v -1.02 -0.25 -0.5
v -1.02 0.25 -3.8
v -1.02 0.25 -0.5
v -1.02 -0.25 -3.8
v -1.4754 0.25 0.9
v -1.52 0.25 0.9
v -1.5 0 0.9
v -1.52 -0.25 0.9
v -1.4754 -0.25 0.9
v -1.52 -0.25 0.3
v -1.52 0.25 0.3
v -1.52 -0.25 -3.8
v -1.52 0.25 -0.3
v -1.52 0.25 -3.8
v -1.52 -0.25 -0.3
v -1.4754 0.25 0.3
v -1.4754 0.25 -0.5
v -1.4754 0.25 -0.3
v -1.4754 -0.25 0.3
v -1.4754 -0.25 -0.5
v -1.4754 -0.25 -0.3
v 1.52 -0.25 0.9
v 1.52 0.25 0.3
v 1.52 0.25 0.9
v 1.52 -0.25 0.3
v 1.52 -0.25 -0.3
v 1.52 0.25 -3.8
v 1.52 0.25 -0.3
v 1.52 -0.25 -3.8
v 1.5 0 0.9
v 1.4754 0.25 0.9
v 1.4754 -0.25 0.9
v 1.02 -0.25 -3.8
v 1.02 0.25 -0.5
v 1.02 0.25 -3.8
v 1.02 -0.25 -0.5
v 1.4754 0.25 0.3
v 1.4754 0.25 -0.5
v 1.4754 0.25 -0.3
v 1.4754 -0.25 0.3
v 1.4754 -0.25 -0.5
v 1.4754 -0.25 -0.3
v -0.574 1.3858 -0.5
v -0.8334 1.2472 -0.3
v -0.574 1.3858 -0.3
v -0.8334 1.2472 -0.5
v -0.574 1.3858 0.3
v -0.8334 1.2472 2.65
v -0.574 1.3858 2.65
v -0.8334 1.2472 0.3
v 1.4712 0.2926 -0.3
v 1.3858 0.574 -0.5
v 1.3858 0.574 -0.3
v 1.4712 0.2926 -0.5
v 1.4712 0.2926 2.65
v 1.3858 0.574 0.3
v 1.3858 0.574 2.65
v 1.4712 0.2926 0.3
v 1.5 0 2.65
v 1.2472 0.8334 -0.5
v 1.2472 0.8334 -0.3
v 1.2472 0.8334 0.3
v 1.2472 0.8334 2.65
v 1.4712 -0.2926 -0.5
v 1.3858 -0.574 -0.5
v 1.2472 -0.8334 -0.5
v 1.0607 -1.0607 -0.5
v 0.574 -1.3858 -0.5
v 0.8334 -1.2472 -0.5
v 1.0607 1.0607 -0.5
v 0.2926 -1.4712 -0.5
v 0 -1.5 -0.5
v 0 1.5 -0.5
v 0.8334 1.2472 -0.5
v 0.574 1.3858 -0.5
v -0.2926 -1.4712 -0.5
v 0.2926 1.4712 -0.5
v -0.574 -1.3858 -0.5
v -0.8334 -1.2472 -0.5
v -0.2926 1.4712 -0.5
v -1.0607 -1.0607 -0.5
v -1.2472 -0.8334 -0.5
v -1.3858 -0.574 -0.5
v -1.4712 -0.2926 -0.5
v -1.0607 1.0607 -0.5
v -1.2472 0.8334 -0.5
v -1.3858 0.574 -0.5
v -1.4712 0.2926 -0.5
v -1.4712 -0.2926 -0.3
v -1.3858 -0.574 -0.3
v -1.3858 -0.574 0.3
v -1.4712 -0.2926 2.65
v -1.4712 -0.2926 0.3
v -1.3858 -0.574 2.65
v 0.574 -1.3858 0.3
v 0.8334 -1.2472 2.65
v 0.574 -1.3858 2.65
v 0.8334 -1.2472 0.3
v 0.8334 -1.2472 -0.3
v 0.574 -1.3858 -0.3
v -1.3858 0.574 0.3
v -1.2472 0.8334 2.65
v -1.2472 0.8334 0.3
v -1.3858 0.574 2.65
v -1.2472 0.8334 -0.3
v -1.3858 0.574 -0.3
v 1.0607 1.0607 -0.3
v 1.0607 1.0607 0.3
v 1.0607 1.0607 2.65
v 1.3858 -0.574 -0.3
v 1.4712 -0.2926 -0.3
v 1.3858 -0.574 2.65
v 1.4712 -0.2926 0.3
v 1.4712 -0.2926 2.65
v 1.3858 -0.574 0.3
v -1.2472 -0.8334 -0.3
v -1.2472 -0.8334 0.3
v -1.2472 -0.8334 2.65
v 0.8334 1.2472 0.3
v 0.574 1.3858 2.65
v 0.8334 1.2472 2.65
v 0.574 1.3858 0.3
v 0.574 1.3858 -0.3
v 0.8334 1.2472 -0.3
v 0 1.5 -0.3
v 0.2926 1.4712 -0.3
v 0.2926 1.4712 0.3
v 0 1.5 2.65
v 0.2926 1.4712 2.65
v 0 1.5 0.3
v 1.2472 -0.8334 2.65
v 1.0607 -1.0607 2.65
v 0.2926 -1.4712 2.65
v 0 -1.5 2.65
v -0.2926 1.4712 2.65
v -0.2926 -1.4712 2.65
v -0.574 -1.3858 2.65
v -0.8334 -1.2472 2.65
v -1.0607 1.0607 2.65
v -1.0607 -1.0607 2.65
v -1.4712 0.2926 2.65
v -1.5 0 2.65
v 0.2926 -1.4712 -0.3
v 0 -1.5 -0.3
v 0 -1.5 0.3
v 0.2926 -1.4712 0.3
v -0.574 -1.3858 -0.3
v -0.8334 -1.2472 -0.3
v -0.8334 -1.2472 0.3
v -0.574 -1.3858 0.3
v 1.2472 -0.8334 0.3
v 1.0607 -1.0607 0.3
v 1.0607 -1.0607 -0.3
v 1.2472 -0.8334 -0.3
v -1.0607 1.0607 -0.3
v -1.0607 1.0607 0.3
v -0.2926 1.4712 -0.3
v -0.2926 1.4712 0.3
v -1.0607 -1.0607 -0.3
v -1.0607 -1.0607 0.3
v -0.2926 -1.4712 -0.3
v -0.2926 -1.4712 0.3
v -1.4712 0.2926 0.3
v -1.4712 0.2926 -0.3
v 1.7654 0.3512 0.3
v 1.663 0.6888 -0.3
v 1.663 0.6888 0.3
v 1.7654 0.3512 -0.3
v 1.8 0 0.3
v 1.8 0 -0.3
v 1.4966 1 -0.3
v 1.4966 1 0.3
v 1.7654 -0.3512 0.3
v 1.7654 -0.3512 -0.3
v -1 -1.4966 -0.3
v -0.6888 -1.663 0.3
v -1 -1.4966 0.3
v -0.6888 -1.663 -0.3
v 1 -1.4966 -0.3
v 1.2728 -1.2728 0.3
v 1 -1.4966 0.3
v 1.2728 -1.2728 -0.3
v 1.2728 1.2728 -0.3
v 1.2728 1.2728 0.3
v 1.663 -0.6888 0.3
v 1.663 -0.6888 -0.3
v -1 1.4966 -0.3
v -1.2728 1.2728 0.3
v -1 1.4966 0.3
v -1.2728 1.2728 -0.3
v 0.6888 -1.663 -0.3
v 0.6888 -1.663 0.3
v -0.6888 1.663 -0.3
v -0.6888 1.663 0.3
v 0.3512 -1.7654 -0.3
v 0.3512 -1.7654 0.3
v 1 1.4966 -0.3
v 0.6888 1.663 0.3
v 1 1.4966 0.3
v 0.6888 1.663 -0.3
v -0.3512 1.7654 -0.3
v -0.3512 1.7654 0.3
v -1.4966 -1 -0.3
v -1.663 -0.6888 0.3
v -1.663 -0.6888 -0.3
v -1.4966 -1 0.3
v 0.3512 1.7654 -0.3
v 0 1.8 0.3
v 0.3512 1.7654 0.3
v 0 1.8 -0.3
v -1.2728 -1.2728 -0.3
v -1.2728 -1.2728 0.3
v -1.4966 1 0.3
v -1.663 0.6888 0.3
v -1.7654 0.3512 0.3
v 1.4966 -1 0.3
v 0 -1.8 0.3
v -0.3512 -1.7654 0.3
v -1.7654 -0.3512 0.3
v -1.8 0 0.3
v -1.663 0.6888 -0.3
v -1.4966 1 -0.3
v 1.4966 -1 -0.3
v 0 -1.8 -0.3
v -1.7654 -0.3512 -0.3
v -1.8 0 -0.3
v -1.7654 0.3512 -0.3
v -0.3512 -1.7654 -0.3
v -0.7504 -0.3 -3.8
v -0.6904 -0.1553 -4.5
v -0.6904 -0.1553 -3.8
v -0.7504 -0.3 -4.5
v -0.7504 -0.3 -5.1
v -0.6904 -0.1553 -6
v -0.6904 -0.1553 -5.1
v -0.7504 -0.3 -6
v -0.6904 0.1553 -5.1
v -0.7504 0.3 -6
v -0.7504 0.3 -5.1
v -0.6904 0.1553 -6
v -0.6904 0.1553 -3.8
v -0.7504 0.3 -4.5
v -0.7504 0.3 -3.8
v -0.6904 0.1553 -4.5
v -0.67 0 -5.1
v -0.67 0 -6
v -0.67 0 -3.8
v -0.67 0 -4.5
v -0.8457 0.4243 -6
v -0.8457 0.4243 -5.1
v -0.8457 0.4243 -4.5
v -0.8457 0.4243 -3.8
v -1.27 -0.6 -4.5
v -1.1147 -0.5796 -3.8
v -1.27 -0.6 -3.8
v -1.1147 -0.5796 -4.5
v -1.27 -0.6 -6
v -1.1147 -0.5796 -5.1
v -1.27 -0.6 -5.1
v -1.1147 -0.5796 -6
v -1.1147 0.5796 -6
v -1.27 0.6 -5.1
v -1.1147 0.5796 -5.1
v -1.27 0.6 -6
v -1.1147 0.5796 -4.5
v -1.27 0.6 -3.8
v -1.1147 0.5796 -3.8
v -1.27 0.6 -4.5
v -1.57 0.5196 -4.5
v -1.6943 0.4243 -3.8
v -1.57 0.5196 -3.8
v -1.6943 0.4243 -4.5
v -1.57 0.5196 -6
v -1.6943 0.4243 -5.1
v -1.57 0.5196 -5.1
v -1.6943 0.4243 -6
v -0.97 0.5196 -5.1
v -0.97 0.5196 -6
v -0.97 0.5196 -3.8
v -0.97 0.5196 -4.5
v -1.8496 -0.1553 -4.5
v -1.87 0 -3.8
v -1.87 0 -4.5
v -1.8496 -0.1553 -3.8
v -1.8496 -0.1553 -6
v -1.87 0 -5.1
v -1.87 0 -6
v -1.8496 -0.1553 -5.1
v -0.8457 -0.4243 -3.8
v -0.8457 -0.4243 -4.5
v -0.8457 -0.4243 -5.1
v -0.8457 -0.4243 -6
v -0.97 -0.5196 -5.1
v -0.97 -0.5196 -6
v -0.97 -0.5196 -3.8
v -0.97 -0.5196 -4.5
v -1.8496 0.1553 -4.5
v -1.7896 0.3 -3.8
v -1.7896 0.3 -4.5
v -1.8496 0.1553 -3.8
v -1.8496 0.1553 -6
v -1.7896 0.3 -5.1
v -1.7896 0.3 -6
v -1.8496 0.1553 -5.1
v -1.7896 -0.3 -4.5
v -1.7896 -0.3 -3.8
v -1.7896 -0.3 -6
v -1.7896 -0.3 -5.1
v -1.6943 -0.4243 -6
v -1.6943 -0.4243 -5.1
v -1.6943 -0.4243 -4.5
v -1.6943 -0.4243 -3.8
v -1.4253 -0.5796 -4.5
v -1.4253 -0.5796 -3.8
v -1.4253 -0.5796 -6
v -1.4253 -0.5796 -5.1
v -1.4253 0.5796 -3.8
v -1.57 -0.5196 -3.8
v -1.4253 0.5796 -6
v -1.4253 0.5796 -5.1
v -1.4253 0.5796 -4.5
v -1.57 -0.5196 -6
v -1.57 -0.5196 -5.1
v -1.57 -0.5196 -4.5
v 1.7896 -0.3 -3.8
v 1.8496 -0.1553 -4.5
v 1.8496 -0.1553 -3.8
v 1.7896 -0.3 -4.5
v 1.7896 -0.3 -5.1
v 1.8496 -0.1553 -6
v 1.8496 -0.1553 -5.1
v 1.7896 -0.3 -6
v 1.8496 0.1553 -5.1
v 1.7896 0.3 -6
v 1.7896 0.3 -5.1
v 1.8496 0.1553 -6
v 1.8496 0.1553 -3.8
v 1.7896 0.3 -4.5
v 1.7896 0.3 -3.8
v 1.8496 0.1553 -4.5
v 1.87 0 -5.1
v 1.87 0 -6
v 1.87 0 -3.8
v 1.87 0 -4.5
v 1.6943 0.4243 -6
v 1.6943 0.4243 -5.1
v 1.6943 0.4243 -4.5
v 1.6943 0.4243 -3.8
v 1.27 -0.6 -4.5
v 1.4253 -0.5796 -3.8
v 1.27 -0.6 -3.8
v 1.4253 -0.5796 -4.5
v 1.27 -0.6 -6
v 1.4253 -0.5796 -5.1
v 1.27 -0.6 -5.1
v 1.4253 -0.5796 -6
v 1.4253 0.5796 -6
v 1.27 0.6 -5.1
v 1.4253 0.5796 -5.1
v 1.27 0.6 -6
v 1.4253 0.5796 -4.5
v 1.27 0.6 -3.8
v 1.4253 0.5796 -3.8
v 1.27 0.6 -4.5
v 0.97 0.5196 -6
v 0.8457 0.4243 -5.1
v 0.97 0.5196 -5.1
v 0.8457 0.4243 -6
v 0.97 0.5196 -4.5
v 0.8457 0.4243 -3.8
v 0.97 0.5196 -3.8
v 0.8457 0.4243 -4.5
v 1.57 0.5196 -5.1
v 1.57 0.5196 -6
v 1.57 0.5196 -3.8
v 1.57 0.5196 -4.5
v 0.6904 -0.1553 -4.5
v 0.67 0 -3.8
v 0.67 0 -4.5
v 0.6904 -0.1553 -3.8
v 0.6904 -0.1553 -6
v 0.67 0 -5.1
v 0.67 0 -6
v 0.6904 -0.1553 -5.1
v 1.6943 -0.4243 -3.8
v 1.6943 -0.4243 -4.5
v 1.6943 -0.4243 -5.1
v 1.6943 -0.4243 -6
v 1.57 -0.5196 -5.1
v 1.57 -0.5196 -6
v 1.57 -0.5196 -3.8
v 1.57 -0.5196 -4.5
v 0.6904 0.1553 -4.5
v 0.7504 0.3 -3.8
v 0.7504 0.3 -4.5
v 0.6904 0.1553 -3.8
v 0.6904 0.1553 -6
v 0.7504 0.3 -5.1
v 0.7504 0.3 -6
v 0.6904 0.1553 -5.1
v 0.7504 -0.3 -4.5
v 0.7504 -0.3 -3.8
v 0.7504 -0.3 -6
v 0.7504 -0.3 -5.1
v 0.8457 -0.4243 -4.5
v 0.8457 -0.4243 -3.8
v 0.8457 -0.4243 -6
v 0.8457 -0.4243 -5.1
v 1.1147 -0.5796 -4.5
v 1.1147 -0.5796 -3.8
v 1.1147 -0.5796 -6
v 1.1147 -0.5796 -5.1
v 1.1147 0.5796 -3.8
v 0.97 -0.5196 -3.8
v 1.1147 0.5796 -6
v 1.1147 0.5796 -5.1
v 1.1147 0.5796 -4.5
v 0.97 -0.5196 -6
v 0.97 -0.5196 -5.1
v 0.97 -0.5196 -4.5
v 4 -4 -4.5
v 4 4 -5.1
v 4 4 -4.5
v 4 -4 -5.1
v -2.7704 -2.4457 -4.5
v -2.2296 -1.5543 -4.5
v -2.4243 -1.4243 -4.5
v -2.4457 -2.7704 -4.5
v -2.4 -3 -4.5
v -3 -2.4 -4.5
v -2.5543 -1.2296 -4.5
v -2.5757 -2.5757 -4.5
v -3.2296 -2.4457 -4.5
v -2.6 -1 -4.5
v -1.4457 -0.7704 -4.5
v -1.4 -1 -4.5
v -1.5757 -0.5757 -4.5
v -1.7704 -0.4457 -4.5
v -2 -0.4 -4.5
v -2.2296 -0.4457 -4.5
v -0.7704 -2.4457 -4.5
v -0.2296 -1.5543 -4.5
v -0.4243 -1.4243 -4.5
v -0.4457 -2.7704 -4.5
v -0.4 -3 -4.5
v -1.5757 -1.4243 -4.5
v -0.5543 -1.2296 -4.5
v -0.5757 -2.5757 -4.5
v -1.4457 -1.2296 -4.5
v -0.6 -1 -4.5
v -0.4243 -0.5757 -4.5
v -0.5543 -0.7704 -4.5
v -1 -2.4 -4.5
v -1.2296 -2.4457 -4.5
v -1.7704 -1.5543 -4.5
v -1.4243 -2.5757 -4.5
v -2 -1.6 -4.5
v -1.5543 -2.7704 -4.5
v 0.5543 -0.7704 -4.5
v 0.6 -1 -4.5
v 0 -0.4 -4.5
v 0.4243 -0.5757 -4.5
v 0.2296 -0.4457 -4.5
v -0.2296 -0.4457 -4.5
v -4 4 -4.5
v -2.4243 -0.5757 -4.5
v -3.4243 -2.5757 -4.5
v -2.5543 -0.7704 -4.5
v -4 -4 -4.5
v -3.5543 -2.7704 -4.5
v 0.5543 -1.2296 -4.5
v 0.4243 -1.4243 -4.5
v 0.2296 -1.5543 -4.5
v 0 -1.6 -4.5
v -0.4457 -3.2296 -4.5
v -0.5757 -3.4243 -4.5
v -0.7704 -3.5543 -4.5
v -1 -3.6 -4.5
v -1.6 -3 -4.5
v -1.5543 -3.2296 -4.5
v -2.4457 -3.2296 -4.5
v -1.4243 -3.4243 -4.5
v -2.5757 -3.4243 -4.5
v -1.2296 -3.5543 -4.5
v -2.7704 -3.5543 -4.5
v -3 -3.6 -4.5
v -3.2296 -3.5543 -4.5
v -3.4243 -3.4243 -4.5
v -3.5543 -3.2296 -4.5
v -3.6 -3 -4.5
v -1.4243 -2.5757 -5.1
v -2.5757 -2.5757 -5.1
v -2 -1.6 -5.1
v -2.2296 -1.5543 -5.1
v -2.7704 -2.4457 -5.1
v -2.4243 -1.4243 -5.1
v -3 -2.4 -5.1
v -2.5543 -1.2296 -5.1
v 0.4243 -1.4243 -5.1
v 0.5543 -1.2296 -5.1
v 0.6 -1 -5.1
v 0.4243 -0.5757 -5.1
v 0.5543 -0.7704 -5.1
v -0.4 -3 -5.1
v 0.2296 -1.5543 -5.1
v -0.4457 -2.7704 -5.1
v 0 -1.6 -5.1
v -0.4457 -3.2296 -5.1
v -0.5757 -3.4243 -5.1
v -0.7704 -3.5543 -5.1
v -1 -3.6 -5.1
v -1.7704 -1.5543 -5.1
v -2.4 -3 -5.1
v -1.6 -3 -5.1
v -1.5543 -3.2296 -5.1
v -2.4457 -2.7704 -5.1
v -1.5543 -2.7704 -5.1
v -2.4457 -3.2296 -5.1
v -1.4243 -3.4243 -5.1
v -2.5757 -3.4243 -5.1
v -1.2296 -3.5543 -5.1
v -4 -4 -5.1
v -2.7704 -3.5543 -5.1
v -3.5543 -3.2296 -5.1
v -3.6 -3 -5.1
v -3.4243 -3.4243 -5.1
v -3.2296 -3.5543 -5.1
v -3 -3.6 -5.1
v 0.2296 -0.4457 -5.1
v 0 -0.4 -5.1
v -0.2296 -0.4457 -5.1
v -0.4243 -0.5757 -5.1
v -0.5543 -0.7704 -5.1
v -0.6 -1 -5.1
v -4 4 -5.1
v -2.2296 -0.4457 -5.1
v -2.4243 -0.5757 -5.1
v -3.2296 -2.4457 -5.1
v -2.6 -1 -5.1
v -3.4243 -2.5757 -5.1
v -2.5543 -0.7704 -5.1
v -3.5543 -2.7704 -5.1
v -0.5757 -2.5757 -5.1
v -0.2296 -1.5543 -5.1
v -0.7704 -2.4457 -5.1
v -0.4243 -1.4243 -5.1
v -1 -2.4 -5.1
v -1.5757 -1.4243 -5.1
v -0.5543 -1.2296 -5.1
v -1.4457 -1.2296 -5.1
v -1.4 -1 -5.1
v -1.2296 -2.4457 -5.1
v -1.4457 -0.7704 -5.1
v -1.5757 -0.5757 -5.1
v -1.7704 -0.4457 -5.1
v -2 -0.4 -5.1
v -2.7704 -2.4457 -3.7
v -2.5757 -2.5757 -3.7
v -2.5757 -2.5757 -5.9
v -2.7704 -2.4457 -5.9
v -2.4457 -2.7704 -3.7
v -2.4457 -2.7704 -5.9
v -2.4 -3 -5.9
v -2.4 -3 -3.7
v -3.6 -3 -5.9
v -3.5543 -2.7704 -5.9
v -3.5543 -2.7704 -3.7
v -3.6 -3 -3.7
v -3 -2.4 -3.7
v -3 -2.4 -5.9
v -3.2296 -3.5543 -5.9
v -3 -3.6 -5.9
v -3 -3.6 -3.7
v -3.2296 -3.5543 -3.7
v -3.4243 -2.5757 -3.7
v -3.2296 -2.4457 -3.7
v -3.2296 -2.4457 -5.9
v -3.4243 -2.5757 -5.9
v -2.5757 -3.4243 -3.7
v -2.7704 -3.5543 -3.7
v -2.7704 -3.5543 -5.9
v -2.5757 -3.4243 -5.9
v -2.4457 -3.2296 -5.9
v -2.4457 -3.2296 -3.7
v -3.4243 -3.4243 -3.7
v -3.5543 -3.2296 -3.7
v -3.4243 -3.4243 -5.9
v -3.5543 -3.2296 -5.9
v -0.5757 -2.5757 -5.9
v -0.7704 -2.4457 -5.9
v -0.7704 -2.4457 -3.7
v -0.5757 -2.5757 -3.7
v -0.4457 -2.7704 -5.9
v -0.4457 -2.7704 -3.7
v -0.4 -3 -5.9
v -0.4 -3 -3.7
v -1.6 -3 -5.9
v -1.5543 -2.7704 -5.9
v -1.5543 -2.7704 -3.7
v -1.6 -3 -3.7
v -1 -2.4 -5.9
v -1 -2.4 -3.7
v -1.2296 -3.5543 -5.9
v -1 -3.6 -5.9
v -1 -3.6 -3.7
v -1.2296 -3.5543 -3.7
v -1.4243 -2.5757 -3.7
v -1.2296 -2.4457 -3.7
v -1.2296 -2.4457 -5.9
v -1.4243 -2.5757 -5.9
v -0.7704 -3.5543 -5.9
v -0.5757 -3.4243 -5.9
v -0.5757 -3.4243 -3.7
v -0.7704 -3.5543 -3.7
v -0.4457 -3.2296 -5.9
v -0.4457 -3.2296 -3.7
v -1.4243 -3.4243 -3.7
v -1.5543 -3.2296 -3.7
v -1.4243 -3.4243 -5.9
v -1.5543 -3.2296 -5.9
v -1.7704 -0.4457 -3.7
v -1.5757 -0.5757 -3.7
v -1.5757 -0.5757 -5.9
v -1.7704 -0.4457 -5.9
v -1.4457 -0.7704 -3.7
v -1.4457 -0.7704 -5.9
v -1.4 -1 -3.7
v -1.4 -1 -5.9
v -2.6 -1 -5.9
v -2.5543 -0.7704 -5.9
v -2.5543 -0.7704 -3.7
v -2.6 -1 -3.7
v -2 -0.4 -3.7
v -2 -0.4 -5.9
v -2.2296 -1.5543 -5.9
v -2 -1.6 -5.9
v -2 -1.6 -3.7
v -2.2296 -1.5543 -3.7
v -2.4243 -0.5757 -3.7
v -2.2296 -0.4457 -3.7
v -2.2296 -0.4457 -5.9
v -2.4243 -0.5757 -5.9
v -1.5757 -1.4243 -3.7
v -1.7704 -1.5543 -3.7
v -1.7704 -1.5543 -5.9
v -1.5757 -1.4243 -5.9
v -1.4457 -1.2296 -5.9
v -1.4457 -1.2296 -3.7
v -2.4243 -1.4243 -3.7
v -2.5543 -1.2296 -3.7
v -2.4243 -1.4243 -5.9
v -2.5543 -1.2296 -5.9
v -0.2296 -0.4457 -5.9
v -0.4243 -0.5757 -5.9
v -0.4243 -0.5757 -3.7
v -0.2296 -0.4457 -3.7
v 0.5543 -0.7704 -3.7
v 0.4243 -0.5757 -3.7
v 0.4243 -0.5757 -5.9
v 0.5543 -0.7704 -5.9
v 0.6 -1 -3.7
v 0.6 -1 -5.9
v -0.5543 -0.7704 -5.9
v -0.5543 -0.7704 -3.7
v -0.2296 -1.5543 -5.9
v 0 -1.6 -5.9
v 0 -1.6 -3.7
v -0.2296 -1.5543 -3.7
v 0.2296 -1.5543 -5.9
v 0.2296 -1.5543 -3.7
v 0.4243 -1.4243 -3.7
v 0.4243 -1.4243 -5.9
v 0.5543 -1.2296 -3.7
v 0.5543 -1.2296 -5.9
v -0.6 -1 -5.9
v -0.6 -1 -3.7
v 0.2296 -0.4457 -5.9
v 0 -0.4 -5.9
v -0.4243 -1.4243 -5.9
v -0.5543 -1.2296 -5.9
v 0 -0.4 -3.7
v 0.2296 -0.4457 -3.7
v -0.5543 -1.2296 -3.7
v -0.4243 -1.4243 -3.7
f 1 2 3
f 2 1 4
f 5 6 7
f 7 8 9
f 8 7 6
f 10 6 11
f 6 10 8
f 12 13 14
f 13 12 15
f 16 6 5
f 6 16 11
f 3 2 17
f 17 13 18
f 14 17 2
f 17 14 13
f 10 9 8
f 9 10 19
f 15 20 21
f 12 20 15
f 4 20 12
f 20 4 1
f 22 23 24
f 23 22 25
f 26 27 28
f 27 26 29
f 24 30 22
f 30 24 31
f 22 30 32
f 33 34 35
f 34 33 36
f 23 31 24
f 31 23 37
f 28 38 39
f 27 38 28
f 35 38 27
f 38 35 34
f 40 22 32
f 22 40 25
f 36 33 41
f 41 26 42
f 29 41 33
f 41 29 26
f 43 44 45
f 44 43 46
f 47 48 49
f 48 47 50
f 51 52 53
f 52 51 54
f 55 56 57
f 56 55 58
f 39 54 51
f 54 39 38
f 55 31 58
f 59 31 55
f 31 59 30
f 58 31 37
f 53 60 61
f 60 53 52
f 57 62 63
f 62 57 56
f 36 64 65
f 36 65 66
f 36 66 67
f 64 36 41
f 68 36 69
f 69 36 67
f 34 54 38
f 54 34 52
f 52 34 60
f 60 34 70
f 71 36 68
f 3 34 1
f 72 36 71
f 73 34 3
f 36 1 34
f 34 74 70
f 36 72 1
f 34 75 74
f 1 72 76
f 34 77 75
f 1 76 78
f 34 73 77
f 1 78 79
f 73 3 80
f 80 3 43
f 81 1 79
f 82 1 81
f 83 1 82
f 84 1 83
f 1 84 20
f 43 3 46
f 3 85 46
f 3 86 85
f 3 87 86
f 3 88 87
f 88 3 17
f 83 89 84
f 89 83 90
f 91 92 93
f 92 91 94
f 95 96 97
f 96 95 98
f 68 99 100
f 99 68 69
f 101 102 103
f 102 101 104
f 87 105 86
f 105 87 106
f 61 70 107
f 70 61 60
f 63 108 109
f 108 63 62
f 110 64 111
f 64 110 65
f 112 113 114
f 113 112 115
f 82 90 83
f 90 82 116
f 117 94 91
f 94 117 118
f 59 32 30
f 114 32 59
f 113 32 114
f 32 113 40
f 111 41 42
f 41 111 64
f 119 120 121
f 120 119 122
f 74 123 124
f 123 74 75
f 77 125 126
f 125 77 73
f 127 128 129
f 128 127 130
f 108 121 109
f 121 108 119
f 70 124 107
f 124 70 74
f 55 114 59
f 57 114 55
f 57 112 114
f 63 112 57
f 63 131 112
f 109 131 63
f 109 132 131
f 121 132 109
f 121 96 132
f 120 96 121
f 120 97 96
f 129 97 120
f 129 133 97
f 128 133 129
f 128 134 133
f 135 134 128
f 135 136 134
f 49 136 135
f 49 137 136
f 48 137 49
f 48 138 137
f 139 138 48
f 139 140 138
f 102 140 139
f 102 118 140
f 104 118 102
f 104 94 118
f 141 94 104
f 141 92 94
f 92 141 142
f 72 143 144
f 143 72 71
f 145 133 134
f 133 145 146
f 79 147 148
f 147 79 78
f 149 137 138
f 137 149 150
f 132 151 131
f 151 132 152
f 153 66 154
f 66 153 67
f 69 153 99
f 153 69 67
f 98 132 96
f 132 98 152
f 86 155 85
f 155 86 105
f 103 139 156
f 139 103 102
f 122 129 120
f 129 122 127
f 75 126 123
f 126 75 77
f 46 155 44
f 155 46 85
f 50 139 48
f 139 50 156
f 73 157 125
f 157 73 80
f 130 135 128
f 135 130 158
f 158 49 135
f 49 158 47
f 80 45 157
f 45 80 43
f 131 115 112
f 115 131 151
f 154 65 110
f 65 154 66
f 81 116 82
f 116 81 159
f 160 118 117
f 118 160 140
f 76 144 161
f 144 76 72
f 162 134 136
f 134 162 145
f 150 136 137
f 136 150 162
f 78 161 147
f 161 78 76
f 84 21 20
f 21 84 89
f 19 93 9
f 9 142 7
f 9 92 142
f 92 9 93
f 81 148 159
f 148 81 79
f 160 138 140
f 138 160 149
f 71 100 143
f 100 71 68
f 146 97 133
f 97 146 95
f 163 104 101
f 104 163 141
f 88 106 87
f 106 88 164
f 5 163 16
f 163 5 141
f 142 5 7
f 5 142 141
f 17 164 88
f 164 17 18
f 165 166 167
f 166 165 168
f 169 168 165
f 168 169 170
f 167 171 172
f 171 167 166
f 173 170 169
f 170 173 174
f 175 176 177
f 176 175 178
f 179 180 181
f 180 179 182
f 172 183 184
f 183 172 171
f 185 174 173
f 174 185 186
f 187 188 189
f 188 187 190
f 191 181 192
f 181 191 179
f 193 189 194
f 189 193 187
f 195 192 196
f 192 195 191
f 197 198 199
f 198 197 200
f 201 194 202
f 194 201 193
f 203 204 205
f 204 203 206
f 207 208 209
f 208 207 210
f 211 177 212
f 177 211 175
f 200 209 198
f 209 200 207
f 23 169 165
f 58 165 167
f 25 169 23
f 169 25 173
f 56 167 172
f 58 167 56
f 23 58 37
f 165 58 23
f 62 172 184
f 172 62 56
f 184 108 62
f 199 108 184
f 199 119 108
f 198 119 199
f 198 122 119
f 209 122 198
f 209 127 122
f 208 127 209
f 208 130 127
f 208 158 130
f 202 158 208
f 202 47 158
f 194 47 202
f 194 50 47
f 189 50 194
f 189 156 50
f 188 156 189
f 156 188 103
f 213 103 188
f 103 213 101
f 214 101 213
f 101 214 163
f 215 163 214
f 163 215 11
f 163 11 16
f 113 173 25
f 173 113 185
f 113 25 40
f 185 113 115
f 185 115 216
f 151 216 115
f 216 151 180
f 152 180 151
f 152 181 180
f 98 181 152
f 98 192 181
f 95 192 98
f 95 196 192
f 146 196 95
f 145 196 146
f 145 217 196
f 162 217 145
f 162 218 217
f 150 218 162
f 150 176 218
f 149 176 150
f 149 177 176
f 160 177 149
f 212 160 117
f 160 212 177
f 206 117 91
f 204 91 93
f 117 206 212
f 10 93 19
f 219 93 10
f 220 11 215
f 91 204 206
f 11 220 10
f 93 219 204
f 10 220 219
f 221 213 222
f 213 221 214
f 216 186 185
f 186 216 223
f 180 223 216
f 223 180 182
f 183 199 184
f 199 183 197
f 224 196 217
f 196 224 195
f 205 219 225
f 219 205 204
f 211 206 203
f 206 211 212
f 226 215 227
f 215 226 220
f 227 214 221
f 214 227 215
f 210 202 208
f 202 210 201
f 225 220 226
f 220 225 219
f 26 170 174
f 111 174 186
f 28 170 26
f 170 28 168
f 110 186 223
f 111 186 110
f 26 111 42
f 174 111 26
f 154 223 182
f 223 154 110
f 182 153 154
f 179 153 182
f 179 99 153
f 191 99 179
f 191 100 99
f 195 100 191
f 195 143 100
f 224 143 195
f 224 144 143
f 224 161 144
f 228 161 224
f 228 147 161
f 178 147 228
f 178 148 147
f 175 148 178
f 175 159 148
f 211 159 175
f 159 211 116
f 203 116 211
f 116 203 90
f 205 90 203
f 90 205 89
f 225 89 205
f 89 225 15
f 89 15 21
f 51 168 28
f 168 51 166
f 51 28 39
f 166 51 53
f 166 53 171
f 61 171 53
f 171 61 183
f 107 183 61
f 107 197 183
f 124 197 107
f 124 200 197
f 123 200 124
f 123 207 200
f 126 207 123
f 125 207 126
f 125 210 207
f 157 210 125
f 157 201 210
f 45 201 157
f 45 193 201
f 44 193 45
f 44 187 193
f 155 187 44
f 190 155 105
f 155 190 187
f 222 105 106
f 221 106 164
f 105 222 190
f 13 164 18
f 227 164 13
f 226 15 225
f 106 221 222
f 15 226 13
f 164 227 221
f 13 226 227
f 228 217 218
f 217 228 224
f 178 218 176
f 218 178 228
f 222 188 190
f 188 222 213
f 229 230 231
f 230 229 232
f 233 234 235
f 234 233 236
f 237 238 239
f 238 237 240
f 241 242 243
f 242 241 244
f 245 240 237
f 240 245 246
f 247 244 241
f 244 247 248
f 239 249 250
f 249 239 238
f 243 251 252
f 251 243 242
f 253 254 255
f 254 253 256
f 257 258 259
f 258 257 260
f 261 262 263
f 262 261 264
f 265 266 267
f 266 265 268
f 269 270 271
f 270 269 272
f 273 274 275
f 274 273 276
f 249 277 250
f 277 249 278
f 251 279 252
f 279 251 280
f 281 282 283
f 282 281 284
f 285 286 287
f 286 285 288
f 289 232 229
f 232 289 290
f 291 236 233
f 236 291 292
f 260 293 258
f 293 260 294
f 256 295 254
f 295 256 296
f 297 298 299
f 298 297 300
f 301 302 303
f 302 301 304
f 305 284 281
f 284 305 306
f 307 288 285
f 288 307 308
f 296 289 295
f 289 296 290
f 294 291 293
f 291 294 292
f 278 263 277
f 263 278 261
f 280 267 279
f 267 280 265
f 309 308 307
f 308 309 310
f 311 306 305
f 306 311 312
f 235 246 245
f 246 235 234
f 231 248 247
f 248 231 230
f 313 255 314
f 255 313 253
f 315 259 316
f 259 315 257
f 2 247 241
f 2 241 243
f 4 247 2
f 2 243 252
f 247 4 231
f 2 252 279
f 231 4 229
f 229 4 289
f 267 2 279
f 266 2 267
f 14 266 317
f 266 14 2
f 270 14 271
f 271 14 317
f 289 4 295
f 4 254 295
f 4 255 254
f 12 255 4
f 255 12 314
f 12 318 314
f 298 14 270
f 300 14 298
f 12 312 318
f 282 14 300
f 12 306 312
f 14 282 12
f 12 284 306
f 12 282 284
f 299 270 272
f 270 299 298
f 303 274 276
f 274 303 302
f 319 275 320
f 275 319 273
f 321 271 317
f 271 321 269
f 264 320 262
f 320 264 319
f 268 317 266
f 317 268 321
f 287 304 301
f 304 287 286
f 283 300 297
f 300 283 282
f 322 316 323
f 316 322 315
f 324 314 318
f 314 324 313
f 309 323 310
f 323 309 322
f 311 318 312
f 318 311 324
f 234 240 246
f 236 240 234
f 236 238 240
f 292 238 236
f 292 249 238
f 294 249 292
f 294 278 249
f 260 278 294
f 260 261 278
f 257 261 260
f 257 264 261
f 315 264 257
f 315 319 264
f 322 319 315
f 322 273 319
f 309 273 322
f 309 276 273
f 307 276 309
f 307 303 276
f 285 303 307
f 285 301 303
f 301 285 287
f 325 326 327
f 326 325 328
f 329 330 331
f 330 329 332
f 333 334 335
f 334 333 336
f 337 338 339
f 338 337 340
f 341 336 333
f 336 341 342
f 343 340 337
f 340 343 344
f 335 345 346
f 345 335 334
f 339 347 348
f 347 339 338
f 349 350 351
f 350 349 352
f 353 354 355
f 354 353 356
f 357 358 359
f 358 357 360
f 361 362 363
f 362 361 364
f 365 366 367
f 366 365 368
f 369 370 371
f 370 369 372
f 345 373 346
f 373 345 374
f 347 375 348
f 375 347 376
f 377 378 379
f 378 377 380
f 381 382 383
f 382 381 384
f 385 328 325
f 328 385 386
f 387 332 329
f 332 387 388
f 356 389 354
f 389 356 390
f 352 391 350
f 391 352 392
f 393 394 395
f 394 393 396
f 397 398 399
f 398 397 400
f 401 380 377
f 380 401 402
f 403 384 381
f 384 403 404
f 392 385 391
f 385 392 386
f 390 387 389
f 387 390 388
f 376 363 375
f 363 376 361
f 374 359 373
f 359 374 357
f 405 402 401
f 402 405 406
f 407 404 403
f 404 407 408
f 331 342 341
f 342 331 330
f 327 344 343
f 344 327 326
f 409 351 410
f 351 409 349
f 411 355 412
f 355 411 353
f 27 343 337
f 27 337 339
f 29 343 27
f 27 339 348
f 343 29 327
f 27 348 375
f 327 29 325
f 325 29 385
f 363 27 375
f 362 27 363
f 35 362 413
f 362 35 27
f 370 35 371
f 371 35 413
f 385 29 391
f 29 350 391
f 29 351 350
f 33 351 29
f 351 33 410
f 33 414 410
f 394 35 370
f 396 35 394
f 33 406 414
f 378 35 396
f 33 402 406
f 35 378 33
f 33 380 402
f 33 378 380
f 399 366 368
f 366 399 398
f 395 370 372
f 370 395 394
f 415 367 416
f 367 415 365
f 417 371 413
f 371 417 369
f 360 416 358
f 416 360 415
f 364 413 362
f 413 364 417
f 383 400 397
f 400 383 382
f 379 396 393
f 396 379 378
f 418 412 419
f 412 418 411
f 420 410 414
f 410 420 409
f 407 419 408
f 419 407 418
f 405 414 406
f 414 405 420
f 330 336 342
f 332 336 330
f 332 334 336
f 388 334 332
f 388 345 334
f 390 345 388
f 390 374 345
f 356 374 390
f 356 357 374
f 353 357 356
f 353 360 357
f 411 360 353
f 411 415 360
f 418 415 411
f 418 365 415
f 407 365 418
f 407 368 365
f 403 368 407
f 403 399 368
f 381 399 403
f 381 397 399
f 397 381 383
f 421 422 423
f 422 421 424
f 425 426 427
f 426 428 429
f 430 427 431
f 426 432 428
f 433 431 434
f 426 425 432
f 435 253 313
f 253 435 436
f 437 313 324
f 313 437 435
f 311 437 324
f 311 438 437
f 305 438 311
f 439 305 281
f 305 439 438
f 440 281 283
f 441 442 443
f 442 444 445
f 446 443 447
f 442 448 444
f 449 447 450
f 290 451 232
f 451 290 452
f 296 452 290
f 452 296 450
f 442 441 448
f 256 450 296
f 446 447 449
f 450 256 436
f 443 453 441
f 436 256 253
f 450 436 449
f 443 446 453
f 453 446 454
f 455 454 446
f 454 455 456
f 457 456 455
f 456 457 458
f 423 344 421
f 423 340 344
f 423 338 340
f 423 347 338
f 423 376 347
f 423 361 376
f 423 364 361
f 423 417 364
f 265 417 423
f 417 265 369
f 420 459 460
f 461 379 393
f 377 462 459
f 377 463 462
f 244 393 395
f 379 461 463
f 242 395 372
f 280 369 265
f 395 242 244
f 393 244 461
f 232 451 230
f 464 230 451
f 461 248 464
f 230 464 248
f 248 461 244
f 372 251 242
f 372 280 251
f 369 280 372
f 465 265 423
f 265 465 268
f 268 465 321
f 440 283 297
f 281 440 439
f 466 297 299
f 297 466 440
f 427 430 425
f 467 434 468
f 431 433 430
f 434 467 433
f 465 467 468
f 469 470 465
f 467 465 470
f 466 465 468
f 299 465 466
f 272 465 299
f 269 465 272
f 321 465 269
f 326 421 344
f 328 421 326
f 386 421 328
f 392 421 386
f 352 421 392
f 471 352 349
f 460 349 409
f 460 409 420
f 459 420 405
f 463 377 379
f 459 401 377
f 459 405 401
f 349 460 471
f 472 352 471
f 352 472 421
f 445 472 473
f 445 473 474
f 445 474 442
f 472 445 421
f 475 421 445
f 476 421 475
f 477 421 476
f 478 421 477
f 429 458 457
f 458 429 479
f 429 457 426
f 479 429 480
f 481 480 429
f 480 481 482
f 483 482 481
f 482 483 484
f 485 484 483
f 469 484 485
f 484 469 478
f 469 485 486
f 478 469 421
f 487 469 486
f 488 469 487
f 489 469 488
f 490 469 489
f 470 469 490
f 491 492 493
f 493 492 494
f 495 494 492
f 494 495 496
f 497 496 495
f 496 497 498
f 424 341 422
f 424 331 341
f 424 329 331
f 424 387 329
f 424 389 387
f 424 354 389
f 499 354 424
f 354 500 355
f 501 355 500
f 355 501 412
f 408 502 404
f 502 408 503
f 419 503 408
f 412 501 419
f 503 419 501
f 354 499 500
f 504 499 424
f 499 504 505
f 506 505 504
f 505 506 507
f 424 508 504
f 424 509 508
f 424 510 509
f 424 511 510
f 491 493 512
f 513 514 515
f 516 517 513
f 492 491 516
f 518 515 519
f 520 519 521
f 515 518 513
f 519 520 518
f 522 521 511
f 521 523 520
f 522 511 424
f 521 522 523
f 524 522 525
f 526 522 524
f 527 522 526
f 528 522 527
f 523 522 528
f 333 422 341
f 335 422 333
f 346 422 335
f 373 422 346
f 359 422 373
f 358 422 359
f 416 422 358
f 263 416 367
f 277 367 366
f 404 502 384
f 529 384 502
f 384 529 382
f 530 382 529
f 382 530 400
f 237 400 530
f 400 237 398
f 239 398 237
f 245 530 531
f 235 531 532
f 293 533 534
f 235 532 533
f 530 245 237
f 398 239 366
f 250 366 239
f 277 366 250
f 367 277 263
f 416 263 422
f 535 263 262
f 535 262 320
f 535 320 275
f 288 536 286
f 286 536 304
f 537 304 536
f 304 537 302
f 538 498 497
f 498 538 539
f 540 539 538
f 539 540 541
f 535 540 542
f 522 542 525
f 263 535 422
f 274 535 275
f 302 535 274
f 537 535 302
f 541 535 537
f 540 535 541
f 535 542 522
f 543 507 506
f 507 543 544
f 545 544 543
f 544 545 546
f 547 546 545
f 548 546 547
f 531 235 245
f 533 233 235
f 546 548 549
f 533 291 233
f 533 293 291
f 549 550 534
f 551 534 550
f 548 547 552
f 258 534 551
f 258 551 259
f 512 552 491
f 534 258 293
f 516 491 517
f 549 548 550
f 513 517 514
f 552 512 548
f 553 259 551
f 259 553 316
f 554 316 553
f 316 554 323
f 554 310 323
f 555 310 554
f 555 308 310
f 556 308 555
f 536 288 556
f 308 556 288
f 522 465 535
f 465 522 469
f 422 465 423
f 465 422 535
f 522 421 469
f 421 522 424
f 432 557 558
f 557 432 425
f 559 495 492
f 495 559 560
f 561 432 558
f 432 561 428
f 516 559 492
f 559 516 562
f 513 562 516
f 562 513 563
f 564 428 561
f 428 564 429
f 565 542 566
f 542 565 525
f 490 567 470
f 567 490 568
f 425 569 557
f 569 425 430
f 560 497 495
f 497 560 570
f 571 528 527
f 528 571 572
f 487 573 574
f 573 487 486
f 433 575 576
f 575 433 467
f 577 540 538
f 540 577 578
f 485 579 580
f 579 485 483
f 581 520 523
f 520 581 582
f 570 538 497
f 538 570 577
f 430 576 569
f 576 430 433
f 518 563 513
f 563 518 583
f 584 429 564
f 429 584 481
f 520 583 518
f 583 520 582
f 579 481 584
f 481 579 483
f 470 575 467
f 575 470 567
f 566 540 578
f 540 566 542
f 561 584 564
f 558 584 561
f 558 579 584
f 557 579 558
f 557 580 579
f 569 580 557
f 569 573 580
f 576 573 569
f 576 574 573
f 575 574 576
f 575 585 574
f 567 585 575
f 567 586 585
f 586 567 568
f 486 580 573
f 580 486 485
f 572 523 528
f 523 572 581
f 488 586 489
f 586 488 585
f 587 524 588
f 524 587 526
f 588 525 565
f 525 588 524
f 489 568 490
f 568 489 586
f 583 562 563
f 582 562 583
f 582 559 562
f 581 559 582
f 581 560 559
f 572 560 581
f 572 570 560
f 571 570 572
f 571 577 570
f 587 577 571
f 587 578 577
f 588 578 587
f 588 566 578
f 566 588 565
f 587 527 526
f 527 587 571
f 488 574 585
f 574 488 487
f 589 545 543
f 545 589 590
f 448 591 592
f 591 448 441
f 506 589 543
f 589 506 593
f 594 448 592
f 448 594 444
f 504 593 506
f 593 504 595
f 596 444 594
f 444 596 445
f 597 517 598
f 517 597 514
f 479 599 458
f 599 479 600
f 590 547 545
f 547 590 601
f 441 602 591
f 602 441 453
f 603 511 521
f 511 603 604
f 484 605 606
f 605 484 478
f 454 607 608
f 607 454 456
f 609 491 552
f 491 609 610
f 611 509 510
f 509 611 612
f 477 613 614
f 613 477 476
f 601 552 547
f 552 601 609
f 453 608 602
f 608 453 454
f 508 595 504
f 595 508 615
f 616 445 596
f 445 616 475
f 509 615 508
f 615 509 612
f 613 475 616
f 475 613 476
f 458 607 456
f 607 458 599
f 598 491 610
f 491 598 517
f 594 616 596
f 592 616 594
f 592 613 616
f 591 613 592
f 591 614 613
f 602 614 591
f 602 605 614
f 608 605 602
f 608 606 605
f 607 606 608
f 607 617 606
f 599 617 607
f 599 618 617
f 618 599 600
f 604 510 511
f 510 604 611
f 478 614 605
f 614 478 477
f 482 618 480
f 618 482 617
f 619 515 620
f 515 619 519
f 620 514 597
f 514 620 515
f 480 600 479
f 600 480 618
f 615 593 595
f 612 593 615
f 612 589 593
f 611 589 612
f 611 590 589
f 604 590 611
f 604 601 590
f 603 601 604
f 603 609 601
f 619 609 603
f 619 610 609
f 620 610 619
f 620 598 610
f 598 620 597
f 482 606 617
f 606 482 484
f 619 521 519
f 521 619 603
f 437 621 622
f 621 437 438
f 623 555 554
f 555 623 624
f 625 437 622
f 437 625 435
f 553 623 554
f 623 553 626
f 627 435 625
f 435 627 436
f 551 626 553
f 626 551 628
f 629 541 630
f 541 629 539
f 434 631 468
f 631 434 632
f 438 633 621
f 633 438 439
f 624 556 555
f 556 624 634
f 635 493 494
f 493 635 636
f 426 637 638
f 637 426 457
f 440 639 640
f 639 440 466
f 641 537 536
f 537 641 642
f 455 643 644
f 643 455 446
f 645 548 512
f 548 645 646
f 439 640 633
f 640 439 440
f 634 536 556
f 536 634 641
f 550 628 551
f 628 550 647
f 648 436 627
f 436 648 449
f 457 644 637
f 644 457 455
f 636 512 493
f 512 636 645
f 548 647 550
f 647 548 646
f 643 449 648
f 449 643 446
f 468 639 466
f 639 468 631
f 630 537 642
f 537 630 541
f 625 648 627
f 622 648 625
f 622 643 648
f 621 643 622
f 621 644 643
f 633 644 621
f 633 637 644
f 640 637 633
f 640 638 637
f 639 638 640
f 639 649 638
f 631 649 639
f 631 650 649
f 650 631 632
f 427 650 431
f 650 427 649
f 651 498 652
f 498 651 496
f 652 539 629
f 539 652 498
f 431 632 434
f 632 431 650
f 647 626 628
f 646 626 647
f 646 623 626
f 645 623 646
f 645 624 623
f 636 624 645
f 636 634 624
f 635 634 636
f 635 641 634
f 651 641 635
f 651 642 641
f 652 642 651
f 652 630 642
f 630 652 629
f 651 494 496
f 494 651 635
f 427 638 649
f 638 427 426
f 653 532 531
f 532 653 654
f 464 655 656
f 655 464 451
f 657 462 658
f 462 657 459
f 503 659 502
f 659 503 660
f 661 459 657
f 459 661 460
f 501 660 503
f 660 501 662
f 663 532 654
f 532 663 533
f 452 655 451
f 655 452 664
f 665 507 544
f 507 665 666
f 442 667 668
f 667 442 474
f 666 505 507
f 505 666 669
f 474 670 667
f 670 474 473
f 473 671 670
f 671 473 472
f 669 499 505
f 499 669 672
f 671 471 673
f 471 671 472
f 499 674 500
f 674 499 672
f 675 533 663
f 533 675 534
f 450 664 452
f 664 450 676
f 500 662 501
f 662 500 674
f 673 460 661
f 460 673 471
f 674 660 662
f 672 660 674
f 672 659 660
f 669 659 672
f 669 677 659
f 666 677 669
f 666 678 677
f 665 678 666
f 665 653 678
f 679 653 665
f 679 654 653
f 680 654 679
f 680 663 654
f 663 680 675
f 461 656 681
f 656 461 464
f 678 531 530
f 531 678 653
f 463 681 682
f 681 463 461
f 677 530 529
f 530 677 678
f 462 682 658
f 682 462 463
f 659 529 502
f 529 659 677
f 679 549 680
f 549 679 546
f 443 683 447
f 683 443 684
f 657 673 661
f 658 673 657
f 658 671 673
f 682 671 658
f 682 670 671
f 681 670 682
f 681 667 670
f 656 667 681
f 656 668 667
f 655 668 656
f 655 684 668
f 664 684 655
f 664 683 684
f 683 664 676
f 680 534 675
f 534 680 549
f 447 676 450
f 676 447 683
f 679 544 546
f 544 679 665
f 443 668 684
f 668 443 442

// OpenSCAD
// Parameters
led_diameter_mm = 3; //[1.5:6:0.1]
body_height_mm = 3.15; //[1.6:6.3:0.05]
rim_thickness_mm = 0.6; //[0.3:1.2:0.05]
rim_diameter_mm = 3.6; //[2.8:7.2:0.1]
lead_pitch_mm = 2.54; //[1.27:5.08:0.01]
lead_thickness_mm = 0.5; //[0.25:1:0.01]
lead_length_mm = 5; //[2.5:10:0.1]
overlap_mm = 0.8; //[0.3:2:0.1]
grill_plate_w_mm = 8; //[4:16:0.5]
grill_plate_h_mm = 8; //[4:16:0.5]
grill_plate_t_mm = 0.6; //[0.3:1.2:0.05]
grill_hole_d_mm = 1.2; //[0.6:2.4:0.1]
grill_gap_mm = 0.8; //[0.4:1.6:0.1]

// Derived Z references (keep everything connected with slight overlap)
z_rim_center   = 0;
z_rim_top      = z_rim_center + rim_thickness_mm/2;
z_rim_bottom   = z_rim_center - rim_thickness_mm/2;

z_body_center  = z_rim_top + body_height_mm/2 - overlap_mm;  // overlaps into rim

// Leads overlap into rim and extend down to (and slightly into) the plate
z_lead_top     = z_rim_bottom + overlap_mm;                  // inside rim
z_plate_top    = z_rim_bottom - lead_length_mm + overlap_mm; // plate top intersects lead tips
z_plate_center = z_plate_top - grill_plate_t_mm/2;           // plate positioned from its top face

// LED - complete geometry (single connected solid)
module led() {
  union() {
    color("red") {
      // LED Body (overlaps rim)
      translate([0, 0, z_body_center])
        cylinder(r=led_diameter_mm/2, h=body_height_mm, center=true, $fn=32);

      // Rim Flange
      translate([0, 0, z_rim_center])
        cylinder(r=rim_diameter_mm/2, h=rim_thickness_mm, center=true, $fn=32);

      // Leads: compute center so top is at z_lead_top and bottom reaches into plate
      lead_total_h = (z_lead_top - z_plate_top) + overlap_mm; // extra overlap into plate
      z_lead_center = (z_lead_top + z_plate_top)/2;

      for (sx = [-1, 1]) {
        translate([sx*lead_pitch_mm/2, 0, z_lead_center])
          cube([lead_thickness_mm, lead_thickness_mm, lead_total_h], center=true);
      }
    }
  }
}

// Grill Plate + attached cylinders (no floating)
// Also add two "pad" cylinders under the lead positions so the small gray cylinders
// are physically connected to BOTH the plate and the LED leads.
module grill_and_pads() {
  union() {
    color("Silver") {
      // Grill Plate (intersects lead tips)
      translate([0, 0, z_plate_center])
        cube([grill_plate_w_mm, grill_plate_h_mm, grill_plate_t_mm], center=true);

      // Grill Hole Markers (physically attached to plate: same Z, taller than plate)
      hole_h = grill_plate_t_mm + 2*overlap_mm;

      translate([-grill_plate_w_mm/2 + (grill_hole_d_mm + grill_gap_mm)/2,
                 -grill_plate_h_mm/2 + (grill_hole_d_mm + grill_gap_mm)/2,
                 z_plate_center])
        cylinder(r=grill_hole_d_mm/2, h=hole_h, center=true, $fn=16);

      translate([-grill_plate_w_mm/2 + 3*(grill_hole_d_mm + grill_gap_mm)/2,
                 -grill_plate_h_mm/2 + (grill_hole_d_mm + grill_gap_mm)/2,
                 z_plate_center])
        cylinder(r=grill_hole_d_mm/2, h=hole_h, center=true, $fn=16);

      translate([-grill_plate_w_mm/2 + (grill_hole_d_mm + grill_gap_mm),
                 -grill_plate_h_mm/2 + 3*(grill_hole_d_mm + grill_gap_mm)/2,
                 z_plate_center])
        cylinder(r=grill_hole_d_mm/2, h=hole_h, center=true, $fn=16);

      translate([-grill_plate_w_mm/2 + 2*(grill_hole_d_mm + grill_gap_mm),
                 -grill_plate_h_mm/2 + 3*(grill_hole_d_mm + grill_gap_mm)/2,
                 z_plate_center])
        cylinder(r=grill_hole_d_mm/2, h=hole_h, center=true, $fn=16);

      // Through-hole pad cylinders (the previously floating gray cylinders):
      // Place them at the lead XY positions and make them penetrate the plate
      // and overlap upward into the lead tips.
      pad_r = max(grill_hole_d_mm/2, lead_thickness_mm*1.2);
      pad_h = grill_plate_t_mm + 2*overlap_mm; // ensures intersection with plate and lead
      z_pad_center = z_plate_center + grill_plate_t_mm/2 - overlap_mm/2; // slightly above plate center

      for (sx = [-1, 1]) {
        translate([sx*lead_pitch_mm/2, 0, z_pad_center])
          cylinder(r=pad_r, h=pad_h, center=true, $fn=24);
      }
    }
  }
}

// Assembly: single solid union so nothing is disconnected
module assembly() {
  union() {
    led();
    grill_and_pads();
  }
}

assembly();
